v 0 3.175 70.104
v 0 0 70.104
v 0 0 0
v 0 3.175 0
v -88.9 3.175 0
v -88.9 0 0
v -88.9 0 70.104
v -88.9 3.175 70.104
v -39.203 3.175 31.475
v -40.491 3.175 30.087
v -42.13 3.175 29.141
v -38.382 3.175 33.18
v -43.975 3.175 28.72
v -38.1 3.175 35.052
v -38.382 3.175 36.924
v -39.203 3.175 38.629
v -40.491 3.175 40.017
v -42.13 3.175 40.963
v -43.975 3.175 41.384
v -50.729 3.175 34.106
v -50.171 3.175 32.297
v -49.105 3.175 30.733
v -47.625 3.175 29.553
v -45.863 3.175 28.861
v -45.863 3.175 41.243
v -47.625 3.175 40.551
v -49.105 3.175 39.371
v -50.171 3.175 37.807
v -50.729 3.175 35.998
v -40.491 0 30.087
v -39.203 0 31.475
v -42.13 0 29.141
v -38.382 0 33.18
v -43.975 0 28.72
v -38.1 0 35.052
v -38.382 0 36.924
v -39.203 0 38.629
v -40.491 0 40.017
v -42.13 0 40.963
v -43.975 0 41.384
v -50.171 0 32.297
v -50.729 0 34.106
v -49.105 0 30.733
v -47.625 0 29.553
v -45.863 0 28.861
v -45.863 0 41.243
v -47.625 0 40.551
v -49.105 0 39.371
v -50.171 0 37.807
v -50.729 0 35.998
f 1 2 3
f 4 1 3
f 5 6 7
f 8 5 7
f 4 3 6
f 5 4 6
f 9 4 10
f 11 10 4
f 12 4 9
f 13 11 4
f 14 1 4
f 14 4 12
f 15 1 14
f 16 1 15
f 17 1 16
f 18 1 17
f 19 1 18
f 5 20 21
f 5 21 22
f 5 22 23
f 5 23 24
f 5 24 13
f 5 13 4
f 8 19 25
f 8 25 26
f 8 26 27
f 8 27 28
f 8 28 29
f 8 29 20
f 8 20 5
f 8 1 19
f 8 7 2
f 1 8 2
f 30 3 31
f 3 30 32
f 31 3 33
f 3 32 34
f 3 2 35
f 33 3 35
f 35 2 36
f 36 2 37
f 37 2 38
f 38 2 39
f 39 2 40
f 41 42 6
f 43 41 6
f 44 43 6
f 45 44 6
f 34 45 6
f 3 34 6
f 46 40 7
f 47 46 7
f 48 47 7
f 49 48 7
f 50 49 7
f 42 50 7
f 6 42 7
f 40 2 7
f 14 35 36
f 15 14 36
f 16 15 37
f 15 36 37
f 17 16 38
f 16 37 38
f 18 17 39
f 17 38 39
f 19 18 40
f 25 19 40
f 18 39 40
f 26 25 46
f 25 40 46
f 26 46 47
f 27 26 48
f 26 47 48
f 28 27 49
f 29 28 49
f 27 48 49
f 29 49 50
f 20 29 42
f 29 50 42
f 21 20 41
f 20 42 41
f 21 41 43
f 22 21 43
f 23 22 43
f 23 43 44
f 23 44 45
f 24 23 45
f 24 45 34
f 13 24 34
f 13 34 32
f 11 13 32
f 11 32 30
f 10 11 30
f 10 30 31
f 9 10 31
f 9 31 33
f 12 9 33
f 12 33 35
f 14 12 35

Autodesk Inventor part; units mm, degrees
ref_plane "YZ Plane" through (0, 0, 0) normal (1, 0, 0) x (0, 1, 0)
ref_plane "XZ Plane" through (0, 0, 0) normal (0, 1, 0) x (-1, 0, 0)
ref_plane "XY Plane" through (0, 0, 0) normal (0, 0, 1) x (1, 0, 0)
sketch "Sketch1" plane through (0, 0, 0) normal (0, 1, 0) x (-1, 0, 0)
  line L0 (0, 0) -> (88.9, 0)
  line L1 (88.9, 0) -> (88.9, 70.104)
  line L2 (88.9, 70.104) -> (0, 70.104)
  line L3 (0, 70.104) -> (0, 0)
  dimension "d6" = 88.9
  dimension "d7" = 70.104
extrude "Extrusion1" add sketch "Sketch1" along normal blind 3.175
sketch "Sketch2" plane through (0, 0, 0) normal (0, -1, 0) x (1, 0, 0)
  line L0 (0, 0) -> (-88.9, 0) projected
  line L1 (0, 70.104) -> (0, 0) projected
  line L2 (-88.9, 70.104) -> (0, 70.104) projected
  line L3 (-88.9, 0) -> (-88.9, 70.104) projected
  circle A0 centre (-44.45, 35.052) radius 6.35
  dimension "d8" = 12.7
  dimension "d9" = 44.45
  dimension "d10" = 44.45
  dimension "d11" = 35.052
  dimension "d12" = 35.052
extrude "Extrusion2" cut sketch "Sketch2" against normal through all contours A0
equation "\"d9\" = d10"
equation "\"d11\" = d12"
properties part number "zMotorMount"
